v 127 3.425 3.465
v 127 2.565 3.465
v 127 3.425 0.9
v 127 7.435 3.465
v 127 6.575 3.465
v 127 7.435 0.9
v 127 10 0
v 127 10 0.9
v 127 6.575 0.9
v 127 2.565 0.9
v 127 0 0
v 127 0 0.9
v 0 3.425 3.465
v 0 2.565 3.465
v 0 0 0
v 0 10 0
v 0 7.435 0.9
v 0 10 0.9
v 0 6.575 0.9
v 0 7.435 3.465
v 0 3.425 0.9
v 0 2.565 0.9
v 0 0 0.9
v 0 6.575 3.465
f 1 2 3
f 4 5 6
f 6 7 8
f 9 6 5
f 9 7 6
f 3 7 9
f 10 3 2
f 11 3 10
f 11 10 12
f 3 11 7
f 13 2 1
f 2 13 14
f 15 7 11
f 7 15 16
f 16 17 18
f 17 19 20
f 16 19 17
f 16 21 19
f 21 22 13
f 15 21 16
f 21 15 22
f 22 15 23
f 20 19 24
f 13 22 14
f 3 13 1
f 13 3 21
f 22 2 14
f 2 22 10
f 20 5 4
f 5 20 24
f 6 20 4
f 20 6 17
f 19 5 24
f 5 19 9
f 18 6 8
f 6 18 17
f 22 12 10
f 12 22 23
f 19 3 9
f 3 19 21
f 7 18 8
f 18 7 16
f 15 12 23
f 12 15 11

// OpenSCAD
//SpaltBueroWand.scad
s1a=5.1; //spalt-w1-anfang: 5.1
s1e=4.87;//spalt-w1-ende: 4.87

s=s1e;

h=5; //feste hoehe für alle stücke

d=h*2;

t=0.86;
tz=0.3+0.2+0.2+0.2; //0.9

w1=380; //Wandteil 1
w2=700; //2
w3=390; //3

w=127; //Länge der einzelnen Stücke

//Abstand Clip
ac=s-t;

//Versatz Clip
vc=(d-s)/2;

cube([w, d, tz]);

module clip()
{
cube([w, t, vc+tz]);
translate([0,ac,0])
cube([w, t, vc+tz]);
}

translate([0,vc,0])
clip();
